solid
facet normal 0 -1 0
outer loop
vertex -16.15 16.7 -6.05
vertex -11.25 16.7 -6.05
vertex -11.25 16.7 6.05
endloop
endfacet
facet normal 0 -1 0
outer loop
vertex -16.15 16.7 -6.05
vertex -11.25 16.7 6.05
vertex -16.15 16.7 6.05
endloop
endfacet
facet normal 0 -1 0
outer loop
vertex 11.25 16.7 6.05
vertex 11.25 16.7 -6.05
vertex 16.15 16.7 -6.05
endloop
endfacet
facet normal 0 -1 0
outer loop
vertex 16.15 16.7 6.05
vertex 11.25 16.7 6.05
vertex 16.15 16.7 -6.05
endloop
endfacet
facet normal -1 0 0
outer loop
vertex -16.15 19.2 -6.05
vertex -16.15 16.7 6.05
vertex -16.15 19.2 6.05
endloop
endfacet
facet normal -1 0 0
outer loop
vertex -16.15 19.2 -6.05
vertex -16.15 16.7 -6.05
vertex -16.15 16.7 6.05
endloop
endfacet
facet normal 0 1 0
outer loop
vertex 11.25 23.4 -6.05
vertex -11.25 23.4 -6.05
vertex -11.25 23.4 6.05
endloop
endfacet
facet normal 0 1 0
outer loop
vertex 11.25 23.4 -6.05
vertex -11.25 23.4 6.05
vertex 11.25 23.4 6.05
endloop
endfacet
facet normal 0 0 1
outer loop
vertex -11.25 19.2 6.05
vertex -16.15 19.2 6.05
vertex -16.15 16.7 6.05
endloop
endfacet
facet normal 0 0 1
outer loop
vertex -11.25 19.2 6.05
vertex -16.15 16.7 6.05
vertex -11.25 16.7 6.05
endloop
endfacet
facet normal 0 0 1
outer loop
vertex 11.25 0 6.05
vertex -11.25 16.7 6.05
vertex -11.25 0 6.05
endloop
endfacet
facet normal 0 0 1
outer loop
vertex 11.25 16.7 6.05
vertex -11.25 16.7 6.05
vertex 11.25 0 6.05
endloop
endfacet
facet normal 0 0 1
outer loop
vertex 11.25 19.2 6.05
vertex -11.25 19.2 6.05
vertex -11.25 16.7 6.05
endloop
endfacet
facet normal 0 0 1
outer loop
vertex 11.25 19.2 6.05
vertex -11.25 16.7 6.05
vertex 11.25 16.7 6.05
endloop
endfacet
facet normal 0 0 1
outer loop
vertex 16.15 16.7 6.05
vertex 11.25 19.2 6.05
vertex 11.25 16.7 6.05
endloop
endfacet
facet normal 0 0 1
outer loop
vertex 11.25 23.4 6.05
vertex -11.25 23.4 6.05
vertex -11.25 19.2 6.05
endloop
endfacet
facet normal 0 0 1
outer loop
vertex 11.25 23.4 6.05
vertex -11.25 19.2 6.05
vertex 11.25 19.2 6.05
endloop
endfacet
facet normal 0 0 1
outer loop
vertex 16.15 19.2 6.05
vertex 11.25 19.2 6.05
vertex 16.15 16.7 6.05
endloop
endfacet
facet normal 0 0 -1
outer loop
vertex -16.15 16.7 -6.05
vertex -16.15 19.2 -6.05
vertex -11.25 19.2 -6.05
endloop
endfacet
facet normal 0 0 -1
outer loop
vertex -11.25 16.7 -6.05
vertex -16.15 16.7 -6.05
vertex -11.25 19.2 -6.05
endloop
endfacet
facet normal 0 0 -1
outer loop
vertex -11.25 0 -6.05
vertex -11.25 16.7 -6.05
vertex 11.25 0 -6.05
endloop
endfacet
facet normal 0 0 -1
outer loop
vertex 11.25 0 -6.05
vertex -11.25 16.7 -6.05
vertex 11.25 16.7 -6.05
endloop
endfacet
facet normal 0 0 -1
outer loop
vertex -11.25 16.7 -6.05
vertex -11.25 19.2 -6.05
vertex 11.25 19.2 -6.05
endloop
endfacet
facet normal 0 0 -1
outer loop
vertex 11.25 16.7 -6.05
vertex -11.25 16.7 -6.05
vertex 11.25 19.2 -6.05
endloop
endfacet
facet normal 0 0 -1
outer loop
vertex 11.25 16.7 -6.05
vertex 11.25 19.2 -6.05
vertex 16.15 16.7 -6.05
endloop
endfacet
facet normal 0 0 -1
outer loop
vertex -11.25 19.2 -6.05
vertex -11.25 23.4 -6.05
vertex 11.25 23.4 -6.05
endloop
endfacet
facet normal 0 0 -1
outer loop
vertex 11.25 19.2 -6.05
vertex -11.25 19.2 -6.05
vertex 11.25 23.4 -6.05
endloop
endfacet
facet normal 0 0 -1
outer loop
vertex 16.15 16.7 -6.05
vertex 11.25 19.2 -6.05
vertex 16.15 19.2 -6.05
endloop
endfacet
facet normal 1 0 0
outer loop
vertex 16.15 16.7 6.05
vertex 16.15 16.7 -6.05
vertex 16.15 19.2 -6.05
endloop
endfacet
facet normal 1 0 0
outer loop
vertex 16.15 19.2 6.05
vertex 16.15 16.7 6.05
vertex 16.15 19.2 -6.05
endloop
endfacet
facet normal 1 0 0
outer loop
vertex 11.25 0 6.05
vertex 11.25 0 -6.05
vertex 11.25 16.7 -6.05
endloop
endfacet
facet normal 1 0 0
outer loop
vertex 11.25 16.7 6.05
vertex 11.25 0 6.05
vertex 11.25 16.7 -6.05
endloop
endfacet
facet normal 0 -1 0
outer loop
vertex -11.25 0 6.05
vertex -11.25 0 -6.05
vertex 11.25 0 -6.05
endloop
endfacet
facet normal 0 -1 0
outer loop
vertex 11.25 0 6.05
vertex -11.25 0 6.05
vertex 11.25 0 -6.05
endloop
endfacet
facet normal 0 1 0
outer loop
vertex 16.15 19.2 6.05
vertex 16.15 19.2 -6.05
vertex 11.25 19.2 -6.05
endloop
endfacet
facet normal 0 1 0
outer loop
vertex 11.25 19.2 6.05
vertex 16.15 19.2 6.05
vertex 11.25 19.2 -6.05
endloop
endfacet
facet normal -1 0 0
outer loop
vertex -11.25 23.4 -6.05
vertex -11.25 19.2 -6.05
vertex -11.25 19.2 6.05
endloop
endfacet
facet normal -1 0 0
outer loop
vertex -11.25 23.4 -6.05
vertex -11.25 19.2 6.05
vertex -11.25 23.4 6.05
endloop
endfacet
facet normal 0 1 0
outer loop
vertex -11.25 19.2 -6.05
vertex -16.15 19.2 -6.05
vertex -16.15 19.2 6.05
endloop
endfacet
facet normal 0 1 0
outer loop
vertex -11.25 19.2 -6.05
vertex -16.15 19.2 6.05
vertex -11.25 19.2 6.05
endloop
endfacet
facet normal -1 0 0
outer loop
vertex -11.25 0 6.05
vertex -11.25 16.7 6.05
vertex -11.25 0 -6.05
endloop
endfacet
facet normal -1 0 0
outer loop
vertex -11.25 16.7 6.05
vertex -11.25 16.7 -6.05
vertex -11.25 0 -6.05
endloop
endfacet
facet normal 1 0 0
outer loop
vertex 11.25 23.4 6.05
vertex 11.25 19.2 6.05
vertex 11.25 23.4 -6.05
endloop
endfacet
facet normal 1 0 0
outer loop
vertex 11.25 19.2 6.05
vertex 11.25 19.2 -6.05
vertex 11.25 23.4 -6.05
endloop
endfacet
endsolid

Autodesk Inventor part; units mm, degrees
sketch "Skizze1" plane through (0, 0, 0) normal (0, 0, 1) x (1, 0, 0)
  line L0 (-11.25, 0) -> (11.25, 0)
  line L1 (11.25, 0) -> (11.25, 16.7)
  line L2 (11.25, 16.7) -> (-11.25, 16.7)
  line L3 (-11.25, 16.7) -> (-11.25, 0)
  line L4 (0, -4.68) -> (0, 28.08) projected
  line L5 (-11.25, 16.7) -> (-16.15, 16.7)
  line L6 (-16.15, 16.7) -> (-16.15, 19.2)
  line L7 (-16.15, 19.2) -> (-11.25, 19.2)
  line L8 (-11.25, 19.2) -> (-11.25, 23.4)
  line L9 (-11.25, 23.4) -> (0, 23.4)
  line L10 (11.25, 16.7) -> (16.15, 16.7)
  line L11 (16.15, 16.7) -> (16.15, 19.2)
  line L12 (16.15, 19.2) -> (11.25, 19.2)
  line L13 (11.25, 19.2) -> (11.25, 23.4)
  line L14 (11.25, 23.4) -> (0, 23.4)
  point P0 (0, 0)
  dimension "d0" = 22.5
  dimension "d1" = 16.7
  dimension "d2" = 4.9
  dimension "d3" = 2.5
  dimension "d4" = 4.2
  dimension "d5" = 22.5
extrude "Extrusion1" add sketch "Skizze1" along normal mid plane 12.1
properties part number "Motortest"
